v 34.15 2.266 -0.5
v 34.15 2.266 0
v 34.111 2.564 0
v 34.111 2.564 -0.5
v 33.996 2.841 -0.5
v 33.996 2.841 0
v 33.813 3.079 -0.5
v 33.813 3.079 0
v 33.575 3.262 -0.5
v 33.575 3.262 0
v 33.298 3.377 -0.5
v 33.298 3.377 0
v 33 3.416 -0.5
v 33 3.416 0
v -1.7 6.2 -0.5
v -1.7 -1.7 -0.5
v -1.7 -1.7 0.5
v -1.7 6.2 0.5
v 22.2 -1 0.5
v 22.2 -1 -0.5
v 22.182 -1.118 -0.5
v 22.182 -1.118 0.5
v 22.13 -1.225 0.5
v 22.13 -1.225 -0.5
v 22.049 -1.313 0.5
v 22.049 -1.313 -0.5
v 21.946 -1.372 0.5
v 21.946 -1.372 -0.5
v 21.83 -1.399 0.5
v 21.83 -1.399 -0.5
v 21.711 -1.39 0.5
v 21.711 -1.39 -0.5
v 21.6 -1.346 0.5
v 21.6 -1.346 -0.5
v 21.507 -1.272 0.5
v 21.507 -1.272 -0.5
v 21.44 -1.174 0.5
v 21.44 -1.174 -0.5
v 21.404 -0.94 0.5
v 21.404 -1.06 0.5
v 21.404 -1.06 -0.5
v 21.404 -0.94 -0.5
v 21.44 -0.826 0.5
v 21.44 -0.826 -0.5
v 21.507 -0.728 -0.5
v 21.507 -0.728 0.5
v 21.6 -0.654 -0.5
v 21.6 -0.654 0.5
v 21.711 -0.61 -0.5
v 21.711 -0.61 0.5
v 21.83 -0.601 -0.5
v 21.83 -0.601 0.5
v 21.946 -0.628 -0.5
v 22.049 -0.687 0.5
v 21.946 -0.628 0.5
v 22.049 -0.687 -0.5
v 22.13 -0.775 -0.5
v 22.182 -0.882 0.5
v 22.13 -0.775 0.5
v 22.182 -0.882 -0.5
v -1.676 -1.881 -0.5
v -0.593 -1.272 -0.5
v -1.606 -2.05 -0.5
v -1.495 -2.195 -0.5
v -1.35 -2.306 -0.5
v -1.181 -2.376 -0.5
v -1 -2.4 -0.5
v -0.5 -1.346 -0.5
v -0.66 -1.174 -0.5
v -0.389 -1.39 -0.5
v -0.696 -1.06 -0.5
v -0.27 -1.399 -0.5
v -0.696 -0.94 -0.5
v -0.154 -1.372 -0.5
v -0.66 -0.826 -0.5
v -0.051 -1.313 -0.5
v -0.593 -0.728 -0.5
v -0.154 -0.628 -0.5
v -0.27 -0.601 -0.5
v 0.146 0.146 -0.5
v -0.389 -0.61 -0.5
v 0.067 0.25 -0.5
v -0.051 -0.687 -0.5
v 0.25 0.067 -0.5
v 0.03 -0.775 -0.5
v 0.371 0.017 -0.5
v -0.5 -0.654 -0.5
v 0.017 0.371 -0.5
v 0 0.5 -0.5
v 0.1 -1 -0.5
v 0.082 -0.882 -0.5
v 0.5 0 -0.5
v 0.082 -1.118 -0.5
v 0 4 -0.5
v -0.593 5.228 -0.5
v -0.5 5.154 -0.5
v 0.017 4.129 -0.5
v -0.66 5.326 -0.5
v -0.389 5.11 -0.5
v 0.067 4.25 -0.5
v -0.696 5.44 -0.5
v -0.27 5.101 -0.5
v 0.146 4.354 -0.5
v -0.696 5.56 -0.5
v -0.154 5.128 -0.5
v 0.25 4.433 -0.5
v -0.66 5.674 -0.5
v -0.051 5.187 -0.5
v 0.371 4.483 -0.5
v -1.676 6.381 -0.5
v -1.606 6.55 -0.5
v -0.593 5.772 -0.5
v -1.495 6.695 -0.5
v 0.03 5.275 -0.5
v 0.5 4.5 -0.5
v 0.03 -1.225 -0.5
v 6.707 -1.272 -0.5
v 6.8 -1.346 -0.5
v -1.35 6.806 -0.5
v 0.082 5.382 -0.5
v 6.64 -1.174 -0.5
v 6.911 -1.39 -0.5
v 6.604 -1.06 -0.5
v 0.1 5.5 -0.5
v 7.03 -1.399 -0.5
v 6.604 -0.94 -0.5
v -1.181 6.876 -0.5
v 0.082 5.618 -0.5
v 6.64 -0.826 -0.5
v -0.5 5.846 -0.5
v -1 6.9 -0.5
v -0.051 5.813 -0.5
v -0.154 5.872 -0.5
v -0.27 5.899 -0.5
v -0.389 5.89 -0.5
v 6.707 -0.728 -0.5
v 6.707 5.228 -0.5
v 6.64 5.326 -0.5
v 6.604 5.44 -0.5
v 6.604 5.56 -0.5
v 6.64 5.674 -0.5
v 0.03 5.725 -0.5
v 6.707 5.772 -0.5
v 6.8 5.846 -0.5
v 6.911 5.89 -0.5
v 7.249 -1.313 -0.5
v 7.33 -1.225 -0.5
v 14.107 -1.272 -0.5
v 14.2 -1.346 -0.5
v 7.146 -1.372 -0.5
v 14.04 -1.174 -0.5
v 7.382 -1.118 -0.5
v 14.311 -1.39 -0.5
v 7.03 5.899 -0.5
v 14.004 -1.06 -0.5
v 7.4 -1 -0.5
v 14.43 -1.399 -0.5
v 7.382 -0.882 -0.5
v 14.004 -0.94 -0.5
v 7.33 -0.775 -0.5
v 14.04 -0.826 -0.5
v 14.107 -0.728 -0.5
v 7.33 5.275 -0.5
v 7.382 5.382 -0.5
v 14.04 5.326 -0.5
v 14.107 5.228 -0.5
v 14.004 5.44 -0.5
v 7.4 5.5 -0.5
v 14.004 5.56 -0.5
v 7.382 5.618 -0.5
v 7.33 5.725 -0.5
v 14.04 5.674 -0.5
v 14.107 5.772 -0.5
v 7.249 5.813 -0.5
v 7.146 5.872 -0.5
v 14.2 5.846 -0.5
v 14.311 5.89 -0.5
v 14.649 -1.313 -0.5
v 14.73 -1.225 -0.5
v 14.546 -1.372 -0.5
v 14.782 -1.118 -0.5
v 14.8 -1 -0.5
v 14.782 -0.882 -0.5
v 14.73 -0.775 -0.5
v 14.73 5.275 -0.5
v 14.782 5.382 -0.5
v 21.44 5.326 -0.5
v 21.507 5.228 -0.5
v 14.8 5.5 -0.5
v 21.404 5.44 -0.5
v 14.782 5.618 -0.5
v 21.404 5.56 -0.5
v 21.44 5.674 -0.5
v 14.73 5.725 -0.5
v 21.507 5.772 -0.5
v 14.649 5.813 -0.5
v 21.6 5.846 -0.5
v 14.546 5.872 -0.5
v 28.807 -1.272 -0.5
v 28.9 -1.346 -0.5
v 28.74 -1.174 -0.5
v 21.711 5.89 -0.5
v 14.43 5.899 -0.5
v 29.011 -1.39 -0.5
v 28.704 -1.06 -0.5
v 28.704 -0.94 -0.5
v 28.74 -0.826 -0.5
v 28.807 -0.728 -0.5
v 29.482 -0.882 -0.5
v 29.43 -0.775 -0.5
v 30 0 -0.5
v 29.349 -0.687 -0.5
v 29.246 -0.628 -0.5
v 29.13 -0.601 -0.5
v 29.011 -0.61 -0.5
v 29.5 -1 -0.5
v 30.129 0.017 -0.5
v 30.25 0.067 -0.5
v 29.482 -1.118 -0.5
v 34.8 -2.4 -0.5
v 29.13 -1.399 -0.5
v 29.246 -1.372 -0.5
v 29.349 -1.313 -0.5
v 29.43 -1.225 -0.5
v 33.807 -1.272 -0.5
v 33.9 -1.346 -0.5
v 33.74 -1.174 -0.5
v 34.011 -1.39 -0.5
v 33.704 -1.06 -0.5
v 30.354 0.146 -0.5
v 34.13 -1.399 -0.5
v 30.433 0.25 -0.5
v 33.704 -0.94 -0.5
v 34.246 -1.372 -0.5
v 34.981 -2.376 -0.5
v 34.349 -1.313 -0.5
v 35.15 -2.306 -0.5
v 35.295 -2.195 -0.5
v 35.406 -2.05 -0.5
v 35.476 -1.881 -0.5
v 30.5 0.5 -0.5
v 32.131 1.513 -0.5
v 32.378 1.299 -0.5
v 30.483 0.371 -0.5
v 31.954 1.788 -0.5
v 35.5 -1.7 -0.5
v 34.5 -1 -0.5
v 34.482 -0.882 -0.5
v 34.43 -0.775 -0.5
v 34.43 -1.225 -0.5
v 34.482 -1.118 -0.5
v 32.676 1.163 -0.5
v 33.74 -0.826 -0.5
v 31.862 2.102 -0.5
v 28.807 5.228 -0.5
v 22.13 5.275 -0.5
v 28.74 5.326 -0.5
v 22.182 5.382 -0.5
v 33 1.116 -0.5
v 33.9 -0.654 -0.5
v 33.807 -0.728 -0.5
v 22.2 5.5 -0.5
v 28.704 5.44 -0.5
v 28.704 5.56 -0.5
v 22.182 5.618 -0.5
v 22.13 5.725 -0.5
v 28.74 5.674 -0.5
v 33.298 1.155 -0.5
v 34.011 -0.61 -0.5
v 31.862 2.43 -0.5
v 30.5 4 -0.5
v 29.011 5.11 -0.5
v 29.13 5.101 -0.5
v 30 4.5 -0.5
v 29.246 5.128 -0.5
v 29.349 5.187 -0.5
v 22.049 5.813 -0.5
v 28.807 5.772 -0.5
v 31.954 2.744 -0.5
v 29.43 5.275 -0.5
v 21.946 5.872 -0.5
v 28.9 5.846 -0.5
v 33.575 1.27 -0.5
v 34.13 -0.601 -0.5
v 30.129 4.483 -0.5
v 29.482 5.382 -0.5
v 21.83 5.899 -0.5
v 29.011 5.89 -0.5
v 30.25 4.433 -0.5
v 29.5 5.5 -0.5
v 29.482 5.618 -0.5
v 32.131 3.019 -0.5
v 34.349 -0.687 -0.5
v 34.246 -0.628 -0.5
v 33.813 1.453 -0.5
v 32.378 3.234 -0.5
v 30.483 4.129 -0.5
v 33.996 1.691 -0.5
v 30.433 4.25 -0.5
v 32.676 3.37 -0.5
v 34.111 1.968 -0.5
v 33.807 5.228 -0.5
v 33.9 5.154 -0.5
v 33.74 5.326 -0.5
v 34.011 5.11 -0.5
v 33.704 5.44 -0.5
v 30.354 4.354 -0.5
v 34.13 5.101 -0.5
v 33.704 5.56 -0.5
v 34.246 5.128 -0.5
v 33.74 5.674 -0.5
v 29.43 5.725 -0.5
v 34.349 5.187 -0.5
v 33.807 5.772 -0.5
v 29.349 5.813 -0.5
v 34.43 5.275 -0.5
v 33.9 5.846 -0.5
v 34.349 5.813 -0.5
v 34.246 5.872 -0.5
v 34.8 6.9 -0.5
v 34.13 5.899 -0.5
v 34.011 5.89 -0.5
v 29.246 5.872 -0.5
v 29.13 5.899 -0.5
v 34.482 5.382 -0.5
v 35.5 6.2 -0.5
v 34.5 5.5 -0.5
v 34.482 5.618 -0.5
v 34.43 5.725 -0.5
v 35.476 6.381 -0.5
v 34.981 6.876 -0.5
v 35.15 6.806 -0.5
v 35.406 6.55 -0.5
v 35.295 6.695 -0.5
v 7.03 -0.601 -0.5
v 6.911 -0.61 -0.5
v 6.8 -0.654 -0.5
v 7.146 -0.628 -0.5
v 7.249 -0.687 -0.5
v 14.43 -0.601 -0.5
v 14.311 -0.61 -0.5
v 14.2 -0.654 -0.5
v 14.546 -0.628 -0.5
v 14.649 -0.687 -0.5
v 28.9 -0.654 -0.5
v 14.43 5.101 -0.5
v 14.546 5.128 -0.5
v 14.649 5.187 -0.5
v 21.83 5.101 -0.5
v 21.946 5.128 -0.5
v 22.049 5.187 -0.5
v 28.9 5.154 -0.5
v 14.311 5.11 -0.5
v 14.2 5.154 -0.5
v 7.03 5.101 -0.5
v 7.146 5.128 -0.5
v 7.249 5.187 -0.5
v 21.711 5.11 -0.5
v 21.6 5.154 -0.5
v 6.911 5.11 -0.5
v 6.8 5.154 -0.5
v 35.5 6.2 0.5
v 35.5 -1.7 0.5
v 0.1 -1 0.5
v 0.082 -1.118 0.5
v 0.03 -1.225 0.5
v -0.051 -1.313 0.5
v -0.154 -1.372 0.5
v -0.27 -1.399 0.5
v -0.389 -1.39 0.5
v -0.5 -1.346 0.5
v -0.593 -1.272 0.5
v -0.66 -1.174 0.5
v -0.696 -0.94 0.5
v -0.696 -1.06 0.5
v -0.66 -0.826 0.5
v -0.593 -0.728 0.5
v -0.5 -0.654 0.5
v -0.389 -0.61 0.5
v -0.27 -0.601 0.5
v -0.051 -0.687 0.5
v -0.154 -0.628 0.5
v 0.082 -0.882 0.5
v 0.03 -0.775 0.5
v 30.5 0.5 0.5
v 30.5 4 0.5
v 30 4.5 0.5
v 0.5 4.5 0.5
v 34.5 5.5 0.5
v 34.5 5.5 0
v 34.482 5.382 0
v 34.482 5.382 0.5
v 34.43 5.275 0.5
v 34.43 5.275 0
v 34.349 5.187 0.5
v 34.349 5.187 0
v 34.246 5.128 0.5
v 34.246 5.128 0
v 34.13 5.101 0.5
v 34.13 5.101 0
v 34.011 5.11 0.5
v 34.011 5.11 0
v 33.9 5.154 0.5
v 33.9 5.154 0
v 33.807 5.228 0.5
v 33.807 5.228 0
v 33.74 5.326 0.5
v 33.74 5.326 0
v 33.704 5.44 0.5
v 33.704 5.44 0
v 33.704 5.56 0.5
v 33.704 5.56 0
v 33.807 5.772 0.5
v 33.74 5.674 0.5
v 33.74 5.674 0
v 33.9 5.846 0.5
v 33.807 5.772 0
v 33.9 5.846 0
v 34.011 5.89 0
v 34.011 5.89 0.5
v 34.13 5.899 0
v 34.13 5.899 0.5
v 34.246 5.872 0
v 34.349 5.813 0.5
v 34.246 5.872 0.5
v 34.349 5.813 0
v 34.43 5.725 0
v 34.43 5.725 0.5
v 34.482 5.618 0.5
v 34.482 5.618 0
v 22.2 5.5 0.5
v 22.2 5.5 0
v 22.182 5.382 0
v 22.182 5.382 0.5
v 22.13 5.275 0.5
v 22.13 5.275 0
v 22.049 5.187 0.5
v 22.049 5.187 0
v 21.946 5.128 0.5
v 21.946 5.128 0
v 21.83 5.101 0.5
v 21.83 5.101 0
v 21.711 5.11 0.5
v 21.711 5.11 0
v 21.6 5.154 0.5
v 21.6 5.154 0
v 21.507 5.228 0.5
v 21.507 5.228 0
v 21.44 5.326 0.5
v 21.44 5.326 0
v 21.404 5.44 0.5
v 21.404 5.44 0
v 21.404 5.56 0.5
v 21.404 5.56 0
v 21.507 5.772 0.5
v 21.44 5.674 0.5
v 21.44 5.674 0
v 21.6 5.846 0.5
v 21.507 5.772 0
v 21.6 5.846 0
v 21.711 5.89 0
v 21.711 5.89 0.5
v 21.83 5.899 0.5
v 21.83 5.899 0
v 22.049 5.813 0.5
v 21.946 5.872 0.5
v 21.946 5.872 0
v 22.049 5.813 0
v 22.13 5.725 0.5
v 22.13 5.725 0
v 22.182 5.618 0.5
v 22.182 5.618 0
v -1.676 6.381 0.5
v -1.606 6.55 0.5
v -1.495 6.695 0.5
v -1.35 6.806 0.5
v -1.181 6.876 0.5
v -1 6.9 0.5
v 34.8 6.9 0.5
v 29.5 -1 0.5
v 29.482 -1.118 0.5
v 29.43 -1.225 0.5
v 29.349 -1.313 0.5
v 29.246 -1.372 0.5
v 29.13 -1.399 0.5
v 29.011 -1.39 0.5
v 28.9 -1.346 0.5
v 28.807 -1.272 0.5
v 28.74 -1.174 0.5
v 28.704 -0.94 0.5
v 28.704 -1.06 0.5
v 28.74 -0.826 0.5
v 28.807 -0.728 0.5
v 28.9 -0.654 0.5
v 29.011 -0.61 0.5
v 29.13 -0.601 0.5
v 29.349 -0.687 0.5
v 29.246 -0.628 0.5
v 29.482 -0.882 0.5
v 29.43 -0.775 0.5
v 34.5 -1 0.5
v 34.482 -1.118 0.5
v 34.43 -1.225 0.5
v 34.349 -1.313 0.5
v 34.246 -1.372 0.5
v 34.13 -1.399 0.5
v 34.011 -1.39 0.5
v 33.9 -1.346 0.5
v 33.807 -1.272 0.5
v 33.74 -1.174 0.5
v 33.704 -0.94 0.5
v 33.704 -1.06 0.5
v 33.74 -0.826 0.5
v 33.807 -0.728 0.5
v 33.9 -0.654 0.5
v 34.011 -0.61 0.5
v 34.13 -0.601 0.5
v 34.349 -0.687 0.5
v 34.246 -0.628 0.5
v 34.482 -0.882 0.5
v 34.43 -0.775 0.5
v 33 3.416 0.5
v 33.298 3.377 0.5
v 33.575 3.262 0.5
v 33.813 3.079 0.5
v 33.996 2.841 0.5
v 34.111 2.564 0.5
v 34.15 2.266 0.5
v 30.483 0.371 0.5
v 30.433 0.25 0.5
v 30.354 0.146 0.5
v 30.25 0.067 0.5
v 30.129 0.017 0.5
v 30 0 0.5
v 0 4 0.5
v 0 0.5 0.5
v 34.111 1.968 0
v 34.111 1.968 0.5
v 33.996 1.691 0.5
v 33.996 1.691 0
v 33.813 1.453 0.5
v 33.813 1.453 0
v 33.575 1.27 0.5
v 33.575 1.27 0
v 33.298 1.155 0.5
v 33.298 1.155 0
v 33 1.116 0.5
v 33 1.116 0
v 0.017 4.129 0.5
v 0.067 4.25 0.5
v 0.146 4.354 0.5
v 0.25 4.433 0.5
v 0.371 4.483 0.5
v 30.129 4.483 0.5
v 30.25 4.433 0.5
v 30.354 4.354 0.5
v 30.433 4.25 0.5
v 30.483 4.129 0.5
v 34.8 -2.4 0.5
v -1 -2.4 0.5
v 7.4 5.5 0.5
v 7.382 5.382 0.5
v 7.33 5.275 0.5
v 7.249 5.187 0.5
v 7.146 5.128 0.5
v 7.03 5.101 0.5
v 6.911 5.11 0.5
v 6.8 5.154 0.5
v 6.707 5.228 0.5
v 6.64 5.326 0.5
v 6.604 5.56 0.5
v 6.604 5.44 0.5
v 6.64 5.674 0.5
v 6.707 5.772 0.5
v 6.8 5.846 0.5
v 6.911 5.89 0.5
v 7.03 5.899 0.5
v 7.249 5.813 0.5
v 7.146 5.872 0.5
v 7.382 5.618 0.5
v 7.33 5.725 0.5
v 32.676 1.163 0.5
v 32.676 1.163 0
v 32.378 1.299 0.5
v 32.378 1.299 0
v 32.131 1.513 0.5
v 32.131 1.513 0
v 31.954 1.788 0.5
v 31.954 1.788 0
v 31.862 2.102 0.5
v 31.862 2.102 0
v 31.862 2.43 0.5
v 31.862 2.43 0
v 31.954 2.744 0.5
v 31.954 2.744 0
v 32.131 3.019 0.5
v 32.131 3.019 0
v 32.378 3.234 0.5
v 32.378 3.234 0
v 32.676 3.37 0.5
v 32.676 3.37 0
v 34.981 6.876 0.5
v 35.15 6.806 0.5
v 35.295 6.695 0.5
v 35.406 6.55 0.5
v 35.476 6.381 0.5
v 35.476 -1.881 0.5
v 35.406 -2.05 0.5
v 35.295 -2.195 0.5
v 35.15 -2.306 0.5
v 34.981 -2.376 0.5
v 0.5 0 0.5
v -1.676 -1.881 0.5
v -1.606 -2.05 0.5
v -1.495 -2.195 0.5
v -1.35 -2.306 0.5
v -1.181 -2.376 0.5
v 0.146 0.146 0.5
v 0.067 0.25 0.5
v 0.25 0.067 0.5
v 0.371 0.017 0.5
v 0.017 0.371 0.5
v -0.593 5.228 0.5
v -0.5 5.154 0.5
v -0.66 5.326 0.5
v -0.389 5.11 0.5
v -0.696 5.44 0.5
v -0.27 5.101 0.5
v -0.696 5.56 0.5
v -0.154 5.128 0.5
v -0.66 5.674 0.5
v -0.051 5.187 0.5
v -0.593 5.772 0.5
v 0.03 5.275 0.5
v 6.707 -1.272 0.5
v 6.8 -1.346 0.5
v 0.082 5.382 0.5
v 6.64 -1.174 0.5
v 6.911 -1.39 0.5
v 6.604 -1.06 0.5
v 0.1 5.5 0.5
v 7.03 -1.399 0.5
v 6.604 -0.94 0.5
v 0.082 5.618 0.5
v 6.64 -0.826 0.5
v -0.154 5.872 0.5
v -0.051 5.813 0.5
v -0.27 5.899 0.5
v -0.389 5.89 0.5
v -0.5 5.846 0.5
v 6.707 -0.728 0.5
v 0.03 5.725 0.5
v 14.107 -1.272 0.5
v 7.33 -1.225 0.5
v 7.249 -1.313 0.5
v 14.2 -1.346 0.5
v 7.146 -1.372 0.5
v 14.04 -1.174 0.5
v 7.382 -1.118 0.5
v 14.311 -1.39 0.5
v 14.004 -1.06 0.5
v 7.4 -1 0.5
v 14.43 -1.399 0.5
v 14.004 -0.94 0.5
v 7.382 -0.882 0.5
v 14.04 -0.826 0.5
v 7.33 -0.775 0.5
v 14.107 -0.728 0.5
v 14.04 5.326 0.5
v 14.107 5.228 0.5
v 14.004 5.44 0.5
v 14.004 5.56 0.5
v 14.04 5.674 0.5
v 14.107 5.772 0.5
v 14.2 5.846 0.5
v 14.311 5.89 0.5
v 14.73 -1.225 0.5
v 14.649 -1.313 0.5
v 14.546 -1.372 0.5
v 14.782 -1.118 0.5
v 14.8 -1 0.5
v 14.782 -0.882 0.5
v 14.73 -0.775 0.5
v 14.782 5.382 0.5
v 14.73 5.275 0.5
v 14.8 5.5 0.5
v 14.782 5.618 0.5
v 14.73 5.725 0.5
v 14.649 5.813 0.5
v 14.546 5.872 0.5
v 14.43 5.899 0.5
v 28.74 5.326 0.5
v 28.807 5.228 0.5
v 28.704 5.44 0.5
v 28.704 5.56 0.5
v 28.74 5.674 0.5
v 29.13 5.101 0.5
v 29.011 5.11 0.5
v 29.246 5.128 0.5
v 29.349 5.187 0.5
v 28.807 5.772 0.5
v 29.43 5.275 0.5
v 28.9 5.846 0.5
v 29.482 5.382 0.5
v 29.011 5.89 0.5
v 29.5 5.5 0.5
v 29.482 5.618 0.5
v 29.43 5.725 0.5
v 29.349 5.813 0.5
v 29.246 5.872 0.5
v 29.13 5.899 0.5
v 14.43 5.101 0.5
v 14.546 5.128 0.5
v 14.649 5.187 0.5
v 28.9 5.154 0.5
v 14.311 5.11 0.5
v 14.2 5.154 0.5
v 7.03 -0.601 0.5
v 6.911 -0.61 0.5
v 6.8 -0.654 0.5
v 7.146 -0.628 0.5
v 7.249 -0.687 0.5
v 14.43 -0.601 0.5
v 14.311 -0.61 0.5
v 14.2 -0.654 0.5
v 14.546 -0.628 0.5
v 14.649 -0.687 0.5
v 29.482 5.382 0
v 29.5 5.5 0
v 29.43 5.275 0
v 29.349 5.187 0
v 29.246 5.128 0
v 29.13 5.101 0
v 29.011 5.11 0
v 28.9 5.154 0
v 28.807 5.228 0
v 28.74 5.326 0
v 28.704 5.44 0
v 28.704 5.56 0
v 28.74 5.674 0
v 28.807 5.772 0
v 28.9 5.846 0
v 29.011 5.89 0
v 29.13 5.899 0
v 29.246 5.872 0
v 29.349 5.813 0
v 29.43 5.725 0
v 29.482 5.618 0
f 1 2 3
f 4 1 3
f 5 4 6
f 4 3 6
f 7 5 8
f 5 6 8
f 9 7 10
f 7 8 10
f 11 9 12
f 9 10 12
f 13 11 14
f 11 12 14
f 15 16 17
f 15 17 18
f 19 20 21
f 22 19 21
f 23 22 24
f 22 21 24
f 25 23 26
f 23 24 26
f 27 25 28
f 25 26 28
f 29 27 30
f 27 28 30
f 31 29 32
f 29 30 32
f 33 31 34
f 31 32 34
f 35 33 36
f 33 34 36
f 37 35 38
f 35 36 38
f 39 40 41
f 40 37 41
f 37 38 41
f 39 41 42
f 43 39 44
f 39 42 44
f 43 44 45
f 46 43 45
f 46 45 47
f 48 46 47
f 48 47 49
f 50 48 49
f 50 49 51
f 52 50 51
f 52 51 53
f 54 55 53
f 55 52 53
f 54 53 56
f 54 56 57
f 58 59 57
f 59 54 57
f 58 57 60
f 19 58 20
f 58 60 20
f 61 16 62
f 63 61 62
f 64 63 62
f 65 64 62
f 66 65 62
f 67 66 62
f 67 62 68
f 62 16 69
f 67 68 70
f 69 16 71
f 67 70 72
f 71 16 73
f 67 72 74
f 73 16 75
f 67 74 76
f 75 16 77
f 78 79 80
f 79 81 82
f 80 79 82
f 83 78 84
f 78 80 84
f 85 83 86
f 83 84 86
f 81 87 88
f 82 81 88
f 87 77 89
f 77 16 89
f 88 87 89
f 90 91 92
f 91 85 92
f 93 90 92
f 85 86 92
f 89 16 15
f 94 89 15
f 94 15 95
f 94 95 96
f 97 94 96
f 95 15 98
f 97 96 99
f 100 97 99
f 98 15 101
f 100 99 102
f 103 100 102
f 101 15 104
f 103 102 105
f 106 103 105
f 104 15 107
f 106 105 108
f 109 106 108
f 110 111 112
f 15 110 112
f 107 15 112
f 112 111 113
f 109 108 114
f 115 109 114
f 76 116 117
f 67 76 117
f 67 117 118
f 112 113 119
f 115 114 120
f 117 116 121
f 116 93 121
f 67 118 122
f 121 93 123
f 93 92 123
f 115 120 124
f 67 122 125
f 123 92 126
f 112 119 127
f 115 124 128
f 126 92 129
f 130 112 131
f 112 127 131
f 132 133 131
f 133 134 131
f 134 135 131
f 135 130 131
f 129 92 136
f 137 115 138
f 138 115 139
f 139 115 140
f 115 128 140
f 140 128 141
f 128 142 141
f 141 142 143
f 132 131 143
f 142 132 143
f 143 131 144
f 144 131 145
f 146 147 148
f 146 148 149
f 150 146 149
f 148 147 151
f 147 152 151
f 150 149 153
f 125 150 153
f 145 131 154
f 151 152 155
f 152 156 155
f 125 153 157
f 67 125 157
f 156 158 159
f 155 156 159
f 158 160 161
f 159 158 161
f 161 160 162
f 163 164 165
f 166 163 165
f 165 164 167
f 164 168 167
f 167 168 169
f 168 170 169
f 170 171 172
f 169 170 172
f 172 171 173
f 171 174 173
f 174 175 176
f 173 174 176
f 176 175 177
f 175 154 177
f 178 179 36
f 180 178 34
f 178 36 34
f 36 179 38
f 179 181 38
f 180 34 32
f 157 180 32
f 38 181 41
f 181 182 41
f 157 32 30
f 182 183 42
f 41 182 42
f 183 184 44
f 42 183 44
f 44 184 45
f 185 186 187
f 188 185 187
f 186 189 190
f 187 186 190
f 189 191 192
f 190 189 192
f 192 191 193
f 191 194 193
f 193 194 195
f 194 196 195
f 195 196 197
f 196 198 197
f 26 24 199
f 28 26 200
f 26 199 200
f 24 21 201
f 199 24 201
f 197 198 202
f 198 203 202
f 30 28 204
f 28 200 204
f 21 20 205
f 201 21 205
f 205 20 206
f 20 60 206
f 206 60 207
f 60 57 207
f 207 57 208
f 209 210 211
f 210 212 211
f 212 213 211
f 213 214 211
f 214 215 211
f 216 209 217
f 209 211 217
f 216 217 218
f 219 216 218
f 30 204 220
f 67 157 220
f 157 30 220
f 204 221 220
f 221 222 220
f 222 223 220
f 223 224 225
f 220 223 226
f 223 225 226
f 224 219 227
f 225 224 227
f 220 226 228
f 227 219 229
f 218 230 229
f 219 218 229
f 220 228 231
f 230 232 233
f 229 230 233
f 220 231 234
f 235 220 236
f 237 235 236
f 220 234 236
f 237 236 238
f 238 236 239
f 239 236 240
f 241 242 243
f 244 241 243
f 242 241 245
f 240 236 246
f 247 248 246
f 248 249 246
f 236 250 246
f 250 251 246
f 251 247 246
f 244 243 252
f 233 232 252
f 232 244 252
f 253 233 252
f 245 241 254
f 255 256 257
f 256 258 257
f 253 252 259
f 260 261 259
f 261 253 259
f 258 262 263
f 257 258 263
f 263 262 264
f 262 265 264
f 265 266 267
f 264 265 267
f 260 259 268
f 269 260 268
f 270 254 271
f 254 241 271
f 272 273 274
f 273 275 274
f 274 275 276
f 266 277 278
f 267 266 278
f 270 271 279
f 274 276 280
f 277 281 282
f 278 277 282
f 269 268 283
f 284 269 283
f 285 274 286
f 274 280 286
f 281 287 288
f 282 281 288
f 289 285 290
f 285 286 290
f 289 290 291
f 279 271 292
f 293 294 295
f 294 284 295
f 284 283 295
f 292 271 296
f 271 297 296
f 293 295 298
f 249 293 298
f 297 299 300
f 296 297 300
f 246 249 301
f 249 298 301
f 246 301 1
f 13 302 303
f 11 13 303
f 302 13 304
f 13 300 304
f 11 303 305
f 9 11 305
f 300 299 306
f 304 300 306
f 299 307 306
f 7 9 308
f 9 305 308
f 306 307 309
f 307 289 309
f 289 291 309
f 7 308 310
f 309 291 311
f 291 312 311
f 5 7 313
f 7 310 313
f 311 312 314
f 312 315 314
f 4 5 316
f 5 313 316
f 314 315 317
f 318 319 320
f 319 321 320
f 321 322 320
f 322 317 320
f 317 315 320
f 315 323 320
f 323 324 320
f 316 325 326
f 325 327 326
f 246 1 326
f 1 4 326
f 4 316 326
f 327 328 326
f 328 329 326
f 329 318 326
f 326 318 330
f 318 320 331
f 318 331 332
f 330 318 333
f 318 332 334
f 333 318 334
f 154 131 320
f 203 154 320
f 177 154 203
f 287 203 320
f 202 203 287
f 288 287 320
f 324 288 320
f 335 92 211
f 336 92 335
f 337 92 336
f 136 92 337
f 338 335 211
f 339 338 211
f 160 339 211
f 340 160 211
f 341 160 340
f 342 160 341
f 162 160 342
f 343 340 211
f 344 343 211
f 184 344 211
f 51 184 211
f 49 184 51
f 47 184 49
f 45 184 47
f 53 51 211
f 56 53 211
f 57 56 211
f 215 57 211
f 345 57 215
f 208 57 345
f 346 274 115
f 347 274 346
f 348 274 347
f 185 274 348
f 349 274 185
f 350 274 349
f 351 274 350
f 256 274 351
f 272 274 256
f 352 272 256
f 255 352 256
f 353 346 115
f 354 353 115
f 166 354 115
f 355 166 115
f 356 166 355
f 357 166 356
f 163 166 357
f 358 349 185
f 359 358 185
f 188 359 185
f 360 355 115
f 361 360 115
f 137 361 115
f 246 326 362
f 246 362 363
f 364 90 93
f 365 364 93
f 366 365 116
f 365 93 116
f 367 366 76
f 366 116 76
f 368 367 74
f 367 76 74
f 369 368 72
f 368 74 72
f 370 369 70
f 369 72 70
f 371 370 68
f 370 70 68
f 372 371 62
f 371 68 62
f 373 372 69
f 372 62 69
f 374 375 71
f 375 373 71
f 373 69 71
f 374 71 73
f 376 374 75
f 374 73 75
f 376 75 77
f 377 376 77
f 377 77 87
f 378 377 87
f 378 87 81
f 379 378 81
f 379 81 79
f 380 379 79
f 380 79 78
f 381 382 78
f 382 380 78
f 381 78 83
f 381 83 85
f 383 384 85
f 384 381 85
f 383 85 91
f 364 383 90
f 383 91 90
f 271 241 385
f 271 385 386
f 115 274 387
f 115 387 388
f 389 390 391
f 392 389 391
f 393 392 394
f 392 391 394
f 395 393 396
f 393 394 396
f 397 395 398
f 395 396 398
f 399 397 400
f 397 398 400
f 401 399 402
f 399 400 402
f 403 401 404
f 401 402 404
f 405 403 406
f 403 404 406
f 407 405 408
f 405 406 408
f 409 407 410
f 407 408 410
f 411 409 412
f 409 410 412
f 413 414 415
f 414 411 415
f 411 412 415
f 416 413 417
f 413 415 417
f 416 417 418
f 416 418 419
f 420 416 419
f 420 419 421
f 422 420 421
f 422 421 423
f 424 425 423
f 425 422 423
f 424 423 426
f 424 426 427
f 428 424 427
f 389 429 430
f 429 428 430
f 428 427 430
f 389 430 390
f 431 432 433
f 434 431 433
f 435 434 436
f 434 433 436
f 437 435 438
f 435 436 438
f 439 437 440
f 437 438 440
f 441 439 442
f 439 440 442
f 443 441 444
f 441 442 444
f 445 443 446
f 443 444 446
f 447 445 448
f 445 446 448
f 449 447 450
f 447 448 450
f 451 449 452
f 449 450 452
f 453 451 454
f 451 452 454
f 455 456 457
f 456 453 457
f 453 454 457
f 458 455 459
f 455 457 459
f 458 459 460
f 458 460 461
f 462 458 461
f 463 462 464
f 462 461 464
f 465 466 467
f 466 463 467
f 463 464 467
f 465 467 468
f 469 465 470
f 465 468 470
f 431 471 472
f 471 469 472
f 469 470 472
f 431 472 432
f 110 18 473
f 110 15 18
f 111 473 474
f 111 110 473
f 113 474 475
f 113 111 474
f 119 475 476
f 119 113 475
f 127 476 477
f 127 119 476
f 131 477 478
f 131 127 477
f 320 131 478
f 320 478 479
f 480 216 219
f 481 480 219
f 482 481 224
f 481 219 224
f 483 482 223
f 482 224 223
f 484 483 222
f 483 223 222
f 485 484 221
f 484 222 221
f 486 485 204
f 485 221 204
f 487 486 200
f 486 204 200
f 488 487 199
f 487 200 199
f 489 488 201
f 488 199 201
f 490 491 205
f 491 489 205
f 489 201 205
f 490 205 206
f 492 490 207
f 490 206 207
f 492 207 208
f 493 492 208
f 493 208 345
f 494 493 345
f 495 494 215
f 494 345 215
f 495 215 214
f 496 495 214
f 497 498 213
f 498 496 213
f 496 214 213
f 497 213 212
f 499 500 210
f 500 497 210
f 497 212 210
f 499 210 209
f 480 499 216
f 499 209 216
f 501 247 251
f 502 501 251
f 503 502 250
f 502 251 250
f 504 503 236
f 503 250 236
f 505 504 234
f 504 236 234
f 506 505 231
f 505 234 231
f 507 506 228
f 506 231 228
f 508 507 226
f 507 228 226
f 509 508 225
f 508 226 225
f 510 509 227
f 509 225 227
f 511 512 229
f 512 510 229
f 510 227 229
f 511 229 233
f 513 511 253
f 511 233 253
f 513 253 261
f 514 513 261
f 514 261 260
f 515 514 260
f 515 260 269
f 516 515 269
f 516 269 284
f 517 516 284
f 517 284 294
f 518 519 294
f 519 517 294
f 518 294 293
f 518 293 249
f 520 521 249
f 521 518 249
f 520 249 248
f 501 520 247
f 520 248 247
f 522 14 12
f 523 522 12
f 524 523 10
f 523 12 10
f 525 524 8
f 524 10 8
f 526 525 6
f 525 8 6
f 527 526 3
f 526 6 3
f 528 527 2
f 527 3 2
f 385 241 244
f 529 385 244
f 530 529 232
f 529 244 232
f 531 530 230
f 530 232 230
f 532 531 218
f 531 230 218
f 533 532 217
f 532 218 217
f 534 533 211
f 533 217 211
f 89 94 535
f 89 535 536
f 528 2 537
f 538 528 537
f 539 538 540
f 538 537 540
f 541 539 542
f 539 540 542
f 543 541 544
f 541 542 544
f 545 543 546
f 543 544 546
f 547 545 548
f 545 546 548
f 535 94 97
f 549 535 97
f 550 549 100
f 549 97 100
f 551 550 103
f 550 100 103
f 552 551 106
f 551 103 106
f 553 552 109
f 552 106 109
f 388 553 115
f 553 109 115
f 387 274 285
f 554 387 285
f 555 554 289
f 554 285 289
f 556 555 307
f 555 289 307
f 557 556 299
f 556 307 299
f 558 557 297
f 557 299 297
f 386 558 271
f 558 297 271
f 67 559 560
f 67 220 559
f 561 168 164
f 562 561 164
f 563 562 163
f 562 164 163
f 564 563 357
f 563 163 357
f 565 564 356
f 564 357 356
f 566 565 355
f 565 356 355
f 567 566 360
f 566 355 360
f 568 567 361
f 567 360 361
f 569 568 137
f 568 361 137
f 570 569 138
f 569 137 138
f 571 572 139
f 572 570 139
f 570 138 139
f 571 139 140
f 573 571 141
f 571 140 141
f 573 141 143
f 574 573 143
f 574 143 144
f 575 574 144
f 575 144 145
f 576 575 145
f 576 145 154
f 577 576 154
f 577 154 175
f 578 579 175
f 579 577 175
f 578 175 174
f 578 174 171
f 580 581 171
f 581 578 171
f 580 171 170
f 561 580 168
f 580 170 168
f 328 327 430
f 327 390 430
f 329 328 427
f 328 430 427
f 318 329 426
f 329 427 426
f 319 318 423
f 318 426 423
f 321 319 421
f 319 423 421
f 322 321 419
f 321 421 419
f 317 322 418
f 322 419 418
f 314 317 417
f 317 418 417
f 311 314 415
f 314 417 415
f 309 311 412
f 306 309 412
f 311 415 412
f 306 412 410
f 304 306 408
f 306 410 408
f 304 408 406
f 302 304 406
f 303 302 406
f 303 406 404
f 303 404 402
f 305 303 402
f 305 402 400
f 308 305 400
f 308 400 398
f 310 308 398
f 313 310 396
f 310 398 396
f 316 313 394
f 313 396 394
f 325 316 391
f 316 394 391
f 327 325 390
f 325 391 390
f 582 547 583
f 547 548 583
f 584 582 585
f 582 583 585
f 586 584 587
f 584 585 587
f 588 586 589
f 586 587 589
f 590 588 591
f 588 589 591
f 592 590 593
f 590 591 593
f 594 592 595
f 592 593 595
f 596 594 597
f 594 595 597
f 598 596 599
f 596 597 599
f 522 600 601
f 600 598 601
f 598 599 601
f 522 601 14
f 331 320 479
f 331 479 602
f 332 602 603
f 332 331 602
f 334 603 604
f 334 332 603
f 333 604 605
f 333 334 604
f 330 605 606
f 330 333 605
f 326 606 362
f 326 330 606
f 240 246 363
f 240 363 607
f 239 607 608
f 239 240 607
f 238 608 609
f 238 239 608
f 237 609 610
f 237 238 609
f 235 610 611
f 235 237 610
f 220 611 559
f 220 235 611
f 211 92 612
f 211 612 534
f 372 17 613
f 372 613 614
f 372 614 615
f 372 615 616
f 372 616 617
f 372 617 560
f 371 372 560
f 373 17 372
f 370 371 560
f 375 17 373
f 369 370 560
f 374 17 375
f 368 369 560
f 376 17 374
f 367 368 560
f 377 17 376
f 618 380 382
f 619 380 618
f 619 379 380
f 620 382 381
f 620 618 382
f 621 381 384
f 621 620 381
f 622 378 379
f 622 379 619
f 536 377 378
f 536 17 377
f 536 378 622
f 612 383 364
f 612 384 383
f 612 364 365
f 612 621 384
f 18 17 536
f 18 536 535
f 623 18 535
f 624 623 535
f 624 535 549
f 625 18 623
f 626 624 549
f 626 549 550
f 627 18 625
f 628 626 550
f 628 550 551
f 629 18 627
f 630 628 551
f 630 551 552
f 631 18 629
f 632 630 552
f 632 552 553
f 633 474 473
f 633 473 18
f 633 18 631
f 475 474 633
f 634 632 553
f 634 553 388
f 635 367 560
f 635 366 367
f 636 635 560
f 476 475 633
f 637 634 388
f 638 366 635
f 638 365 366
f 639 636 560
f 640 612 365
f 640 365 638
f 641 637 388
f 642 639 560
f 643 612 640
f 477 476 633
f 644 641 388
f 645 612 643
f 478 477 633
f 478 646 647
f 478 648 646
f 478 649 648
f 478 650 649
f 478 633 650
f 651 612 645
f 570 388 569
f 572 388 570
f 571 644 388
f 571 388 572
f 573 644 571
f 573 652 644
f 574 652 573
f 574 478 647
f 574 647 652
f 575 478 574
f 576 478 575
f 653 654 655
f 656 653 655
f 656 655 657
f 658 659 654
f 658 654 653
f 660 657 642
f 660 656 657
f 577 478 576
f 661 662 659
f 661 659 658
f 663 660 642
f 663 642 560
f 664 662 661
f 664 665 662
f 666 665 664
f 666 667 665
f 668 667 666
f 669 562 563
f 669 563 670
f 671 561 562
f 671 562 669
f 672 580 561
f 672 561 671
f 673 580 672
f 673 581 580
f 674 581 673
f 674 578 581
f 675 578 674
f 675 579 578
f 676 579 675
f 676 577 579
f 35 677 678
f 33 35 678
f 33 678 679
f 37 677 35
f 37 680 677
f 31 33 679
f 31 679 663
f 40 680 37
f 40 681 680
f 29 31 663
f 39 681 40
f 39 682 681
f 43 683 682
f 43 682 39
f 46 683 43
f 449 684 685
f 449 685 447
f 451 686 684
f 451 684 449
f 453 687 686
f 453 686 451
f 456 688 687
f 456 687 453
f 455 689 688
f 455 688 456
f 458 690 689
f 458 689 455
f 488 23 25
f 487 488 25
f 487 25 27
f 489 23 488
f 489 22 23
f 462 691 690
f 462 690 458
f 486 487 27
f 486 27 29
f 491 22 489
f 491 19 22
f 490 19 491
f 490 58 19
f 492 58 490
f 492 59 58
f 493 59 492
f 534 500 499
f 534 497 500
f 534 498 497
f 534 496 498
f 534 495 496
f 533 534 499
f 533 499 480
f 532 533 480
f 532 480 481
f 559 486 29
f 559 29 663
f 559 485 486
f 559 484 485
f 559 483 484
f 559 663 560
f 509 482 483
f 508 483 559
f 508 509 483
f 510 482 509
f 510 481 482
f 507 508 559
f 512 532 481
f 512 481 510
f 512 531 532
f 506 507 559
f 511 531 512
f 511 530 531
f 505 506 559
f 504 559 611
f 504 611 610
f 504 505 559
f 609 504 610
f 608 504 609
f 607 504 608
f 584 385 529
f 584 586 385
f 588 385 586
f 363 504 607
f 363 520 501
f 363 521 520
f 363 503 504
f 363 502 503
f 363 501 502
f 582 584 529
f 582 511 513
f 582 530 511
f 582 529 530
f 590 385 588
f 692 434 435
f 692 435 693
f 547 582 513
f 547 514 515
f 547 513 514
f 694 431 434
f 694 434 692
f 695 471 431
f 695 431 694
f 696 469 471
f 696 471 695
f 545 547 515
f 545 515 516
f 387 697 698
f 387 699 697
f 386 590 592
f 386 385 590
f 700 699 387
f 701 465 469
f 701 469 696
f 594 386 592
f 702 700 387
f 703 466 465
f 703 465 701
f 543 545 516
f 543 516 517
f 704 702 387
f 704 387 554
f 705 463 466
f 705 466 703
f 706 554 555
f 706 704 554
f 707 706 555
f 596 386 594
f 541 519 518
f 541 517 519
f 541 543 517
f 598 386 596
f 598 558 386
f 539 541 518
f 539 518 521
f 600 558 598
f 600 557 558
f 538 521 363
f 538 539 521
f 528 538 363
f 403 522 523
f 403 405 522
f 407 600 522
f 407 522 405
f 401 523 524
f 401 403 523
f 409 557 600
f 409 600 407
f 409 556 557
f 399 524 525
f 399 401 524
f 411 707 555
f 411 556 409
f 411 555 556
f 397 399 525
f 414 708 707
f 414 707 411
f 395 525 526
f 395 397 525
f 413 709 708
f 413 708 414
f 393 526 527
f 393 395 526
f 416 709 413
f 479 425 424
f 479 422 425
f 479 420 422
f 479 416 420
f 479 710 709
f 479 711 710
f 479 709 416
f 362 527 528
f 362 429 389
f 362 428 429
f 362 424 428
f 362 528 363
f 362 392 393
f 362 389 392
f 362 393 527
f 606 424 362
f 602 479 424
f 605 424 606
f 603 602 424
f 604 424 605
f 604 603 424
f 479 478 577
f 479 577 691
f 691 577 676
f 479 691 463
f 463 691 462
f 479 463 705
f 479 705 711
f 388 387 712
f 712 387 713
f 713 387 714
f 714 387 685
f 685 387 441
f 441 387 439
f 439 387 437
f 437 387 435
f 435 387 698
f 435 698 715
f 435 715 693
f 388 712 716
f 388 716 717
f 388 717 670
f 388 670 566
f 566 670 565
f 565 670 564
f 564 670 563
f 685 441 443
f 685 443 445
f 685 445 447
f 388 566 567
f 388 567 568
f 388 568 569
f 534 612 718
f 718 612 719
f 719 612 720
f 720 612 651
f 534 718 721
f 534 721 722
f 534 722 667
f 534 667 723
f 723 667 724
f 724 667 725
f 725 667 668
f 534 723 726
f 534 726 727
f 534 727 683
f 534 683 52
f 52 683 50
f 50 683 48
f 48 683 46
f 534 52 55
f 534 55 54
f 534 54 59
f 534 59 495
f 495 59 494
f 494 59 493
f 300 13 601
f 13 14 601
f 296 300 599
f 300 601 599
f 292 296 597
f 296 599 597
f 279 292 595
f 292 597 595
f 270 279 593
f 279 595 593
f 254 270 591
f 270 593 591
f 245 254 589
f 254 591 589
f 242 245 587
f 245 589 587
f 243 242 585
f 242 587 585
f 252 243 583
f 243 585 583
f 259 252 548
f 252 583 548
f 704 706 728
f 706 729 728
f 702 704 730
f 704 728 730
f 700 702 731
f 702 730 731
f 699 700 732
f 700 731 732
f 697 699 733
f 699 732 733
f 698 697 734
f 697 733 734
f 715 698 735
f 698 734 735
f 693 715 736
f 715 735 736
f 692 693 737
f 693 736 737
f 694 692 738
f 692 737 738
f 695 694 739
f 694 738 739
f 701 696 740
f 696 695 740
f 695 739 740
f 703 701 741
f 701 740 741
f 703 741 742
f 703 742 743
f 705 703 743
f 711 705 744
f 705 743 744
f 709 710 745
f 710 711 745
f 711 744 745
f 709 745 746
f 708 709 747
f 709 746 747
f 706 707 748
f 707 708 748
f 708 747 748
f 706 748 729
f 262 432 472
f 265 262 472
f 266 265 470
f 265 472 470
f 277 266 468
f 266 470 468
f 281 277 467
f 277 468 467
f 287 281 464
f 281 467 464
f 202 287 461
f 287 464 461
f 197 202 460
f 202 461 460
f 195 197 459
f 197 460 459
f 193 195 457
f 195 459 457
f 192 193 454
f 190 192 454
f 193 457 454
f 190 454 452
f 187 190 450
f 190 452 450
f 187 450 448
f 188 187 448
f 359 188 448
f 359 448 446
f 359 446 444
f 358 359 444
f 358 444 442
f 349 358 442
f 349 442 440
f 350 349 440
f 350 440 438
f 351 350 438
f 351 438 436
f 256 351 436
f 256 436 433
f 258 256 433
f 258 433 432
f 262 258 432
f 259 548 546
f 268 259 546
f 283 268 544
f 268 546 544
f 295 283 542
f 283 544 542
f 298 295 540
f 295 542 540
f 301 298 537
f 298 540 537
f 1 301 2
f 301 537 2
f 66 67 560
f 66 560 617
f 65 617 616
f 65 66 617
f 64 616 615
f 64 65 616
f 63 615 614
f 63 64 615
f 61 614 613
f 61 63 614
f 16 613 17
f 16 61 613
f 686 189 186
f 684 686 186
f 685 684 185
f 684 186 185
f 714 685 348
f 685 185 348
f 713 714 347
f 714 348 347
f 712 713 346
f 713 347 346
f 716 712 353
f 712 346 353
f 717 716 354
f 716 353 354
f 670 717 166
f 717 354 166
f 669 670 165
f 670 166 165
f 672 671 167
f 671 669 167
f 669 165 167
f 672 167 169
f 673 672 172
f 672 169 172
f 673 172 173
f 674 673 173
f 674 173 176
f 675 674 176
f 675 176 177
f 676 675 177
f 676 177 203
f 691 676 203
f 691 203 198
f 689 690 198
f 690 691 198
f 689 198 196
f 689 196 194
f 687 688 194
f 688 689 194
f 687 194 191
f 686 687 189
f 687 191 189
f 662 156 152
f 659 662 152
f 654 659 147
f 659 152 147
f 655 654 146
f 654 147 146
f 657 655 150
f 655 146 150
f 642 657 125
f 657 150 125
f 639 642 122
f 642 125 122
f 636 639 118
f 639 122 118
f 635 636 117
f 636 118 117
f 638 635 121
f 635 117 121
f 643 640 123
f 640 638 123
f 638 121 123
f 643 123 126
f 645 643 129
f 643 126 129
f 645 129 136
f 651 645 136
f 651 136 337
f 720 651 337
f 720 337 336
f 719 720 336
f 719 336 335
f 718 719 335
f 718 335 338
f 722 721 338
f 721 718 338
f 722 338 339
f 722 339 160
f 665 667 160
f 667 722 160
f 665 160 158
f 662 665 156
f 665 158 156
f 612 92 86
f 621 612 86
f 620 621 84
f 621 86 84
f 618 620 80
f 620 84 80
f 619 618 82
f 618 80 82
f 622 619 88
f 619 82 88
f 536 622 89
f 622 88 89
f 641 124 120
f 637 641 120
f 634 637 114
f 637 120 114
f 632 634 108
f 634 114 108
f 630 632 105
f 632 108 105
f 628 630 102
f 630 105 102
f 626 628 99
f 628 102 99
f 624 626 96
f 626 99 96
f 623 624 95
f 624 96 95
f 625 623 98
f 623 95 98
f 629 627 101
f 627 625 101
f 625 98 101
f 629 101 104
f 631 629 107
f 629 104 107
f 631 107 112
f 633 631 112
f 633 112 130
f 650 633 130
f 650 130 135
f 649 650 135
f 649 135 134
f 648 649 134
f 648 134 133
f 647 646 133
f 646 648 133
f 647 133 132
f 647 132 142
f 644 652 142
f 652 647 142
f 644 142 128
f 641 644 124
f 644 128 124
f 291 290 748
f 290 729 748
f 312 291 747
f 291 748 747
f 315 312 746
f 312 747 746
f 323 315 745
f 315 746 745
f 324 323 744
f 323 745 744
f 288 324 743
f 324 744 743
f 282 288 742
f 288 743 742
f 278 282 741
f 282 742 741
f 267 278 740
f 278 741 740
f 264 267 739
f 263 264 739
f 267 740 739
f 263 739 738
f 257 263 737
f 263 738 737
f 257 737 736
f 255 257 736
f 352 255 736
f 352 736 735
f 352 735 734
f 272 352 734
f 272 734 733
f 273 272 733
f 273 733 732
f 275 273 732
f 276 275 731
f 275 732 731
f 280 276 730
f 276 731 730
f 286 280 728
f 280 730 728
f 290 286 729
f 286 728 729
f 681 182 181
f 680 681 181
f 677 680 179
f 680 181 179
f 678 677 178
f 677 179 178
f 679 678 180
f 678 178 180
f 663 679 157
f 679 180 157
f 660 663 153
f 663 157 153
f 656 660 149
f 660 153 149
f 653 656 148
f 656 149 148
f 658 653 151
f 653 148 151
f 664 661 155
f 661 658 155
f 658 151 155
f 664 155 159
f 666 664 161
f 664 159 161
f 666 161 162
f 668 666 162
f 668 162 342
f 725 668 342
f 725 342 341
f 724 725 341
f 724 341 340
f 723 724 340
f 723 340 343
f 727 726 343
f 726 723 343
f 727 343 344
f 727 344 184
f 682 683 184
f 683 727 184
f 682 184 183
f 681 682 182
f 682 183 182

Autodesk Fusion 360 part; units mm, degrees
sketch "Sketch1" plane through (0, 0, 0) normal (0, 0, 1) x (1, 0, 0)
  line L0 (0.5, 0) -> (30, 0)
  line L1 (30.5, 0.5) -> (30.5, 4)
  line L2 (30, 4.5) -> (0.5, 4.5)
  line L3 (0, 4) -> (0, 0.5)
  arc A0 (0, 0.5) -> (0.5, 0) centre (0.5, 0.5) ccw
  arc A1 (0.5, 4.5) -> (0, 4) centre (0.5, 4) ccw
  arc A2 (30.5, 4) -> (30, 4.5) centre (30, 4) ccw
  arc A3 (30, 0) -> (30.5, 0.5) centre (30, 0.5) ccw
  line L4 (-18.1072, 2.25) -> (79.1072, 2.25) construction
  circle A4 centre (14.4, -1) radius 0.4
  circle A5 centre (-0.3, -1) radius 0.4
  circle A6 centre (7, -1) radius 0.4
  circle A7 centre (21.8, -1) radius 0.4
  circle A8 centre (29.1, -1) radius 0.4
  circle A9 centre (34.1, -1) radius 0.4
  line L5 (-2.117, -1) -> (37.883, -1) construction
  circle A10 centre (34.1, 5.5) radius 0.4
  circle A11 centre (29.1, 5.5) radius 0.4
  circle A12 centre (21.8, 5.5) radius 0.4
  circle A13 centre (14.4, 5.5) radius 0.4
  circle A14 centre (7, 5.5) radius 0.4
  circle A15 centre (-0.3, 5.5) radius 0.4
  line L6 (24, 2.25) -> (37, 2.25) construction
  line L7 (33, 4.7661) -> (33, -0.2339)
  line L8 (-1, 6.9) -> (34.8, 6.9)
  line L9 (35.5, 6.2) -> (35.5, -1.7)
  line L10 (34.8, -2.4) -> (-1, -2.4)
  line L11 (-1.7, -1.7) -> (-1.7, 6.2)
  arc A16 (-1, 6.9) -> (-1.7, 6.2) centre (-1, 6.2) ccw
  arc A17 (-1.7, -1.7) -> (-1, -2.4) centre (-1, -1.7) ccw
  arc A18 (34.8, -2.4) -> (35.5, -1.7) centre (34.8, -1.7) ccw
  arc A19 (35.5, 6.2) -> (34.8, 6.9) centre (34.8, 6.2) ccw
  circle A20 centre (33, 2.2661) radius 1.15
  point P0 (30.5, 0)
  point P1 (0, 4.5)
  point P2 (-1.7, 6.9)
  point P3 (35.5, 6.9)
  point P4 (-1.7, -2.4)
  dimension "d1" = 30.5
  dimension "d2" = 4.5
  dimension "d3" = 0.5
  dimension "d4" = 0.5
  dimension "d5" = 0.5
  dimension "d6" = 0.5
  dimension "d7" = 0.8
  dimension "d8" = 0.8
  dimension "d9" = 0.8
  dimension "d10" = 0.8
  dimension "d11" = 0.8
  dimension "d12" = 0.8
  dimension "d13" = 5
  dimension "d14" = 12.3
  dimension "d15" = 19.7
  dimension "d16" = 27.1
  dimension "d17" = 34.4
  dimension "d18" = 3.6
  dimension "d20" = 5.5
  dimension "d21" = 6.5
  dimension "d22" = 37.2
  dimension "d23" = 9.3
  dimension "d24" = 1.4
  dimension "d25" = 1.4
  dimension "d27" = 1.4
  dimension "d28" = 0.7
  dimension "d29" = 0.7
  dimension "d30" = 0.7
  dimension "d31" = 0.7
  dimension "d32" = 2.5
  dimension "d33" = 2.3
  dimension "d34" = 33.4598
extrude "Extrude1" add sketch "Sketch1" along normal mid plane 1
